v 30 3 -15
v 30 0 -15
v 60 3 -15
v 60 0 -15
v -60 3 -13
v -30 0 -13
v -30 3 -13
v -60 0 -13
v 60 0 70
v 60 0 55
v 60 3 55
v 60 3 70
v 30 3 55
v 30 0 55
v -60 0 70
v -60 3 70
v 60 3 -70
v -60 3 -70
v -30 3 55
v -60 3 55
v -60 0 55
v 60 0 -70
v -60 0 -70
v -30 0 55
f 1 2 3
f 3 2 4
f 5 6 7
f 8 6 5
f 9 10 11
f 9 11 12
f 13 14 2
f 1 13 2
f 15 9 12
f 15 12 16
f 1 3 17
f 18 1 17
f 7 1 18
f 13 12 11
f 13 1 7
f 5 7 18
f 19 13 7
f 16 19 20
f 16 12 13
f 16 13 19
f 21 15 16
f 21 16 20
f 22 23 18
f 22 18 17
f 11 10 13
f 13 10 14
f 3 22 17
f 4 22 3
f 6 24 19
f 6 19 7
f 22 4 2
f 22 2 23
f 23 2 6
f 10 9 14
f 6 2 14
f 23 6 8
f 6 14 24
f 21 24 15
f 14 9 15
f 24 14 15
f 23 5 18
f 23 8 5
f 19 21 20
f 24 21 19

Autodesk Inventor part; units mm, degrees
ref_plane "YZ Plane" through (0, 0, 0) normal (1, 0, 0) x (0, 1, 0)
ref_plane "XZ Plane" through (0, 0, 0) normal (0, 1, 0) x (-1, 0, 0)
ref_plane "XY Plane" through (0, 0, 0) normal (0, 0, 1) x (1, 0, 0)
sketch "Sketch2" plane through (0, 0, 0) normal (0, 1, 0) x (-1, 0, 0)
  line L0 (-60, 70) -> (60, 70)
  line L1 (60, -70) -> (-60, -70)
  line L2 (-60, 70) -> (60, -70) construction
  line L3 (60, 70) -> (-60, -70) construction
  line L4 (-60, 55) -> (-30, 55)
  line L5 (-30, 55) -> (-30, -15)
  line L6 (-30, -15) -> (-60, -15)
  line L7 (-60, -15) -> (-60, 55)
  line L8 (60, 55) -> (30, 55)
  line L9 (30, 55) -> (30, -13)
  line L10 (30, -13) -> (60, -13)
  line L11 (60, 70) -> (60, 55)
  line L12 (60, -13) -> (60, -70)
  line L13 (-60, -70) -> (-60, -15)
  line L14 (-60, 55) -> (-60, 70)
  point P0 (0, 0)
  dimension "d9" = 120
  dimension "d10" = 140
  dimension "d11" = 30
  dimension "d12" = 70
  dimension "d13" = 15
  dimension "d17" = 68
  dimension "d18" = 15
extrude "Extrusion2" add sketch "Sketch2" along normal blind 3 contours L0 L11 L8 L9 L10 L12 L1 L13 L6 L5 L4 L14
properties part number "base"
